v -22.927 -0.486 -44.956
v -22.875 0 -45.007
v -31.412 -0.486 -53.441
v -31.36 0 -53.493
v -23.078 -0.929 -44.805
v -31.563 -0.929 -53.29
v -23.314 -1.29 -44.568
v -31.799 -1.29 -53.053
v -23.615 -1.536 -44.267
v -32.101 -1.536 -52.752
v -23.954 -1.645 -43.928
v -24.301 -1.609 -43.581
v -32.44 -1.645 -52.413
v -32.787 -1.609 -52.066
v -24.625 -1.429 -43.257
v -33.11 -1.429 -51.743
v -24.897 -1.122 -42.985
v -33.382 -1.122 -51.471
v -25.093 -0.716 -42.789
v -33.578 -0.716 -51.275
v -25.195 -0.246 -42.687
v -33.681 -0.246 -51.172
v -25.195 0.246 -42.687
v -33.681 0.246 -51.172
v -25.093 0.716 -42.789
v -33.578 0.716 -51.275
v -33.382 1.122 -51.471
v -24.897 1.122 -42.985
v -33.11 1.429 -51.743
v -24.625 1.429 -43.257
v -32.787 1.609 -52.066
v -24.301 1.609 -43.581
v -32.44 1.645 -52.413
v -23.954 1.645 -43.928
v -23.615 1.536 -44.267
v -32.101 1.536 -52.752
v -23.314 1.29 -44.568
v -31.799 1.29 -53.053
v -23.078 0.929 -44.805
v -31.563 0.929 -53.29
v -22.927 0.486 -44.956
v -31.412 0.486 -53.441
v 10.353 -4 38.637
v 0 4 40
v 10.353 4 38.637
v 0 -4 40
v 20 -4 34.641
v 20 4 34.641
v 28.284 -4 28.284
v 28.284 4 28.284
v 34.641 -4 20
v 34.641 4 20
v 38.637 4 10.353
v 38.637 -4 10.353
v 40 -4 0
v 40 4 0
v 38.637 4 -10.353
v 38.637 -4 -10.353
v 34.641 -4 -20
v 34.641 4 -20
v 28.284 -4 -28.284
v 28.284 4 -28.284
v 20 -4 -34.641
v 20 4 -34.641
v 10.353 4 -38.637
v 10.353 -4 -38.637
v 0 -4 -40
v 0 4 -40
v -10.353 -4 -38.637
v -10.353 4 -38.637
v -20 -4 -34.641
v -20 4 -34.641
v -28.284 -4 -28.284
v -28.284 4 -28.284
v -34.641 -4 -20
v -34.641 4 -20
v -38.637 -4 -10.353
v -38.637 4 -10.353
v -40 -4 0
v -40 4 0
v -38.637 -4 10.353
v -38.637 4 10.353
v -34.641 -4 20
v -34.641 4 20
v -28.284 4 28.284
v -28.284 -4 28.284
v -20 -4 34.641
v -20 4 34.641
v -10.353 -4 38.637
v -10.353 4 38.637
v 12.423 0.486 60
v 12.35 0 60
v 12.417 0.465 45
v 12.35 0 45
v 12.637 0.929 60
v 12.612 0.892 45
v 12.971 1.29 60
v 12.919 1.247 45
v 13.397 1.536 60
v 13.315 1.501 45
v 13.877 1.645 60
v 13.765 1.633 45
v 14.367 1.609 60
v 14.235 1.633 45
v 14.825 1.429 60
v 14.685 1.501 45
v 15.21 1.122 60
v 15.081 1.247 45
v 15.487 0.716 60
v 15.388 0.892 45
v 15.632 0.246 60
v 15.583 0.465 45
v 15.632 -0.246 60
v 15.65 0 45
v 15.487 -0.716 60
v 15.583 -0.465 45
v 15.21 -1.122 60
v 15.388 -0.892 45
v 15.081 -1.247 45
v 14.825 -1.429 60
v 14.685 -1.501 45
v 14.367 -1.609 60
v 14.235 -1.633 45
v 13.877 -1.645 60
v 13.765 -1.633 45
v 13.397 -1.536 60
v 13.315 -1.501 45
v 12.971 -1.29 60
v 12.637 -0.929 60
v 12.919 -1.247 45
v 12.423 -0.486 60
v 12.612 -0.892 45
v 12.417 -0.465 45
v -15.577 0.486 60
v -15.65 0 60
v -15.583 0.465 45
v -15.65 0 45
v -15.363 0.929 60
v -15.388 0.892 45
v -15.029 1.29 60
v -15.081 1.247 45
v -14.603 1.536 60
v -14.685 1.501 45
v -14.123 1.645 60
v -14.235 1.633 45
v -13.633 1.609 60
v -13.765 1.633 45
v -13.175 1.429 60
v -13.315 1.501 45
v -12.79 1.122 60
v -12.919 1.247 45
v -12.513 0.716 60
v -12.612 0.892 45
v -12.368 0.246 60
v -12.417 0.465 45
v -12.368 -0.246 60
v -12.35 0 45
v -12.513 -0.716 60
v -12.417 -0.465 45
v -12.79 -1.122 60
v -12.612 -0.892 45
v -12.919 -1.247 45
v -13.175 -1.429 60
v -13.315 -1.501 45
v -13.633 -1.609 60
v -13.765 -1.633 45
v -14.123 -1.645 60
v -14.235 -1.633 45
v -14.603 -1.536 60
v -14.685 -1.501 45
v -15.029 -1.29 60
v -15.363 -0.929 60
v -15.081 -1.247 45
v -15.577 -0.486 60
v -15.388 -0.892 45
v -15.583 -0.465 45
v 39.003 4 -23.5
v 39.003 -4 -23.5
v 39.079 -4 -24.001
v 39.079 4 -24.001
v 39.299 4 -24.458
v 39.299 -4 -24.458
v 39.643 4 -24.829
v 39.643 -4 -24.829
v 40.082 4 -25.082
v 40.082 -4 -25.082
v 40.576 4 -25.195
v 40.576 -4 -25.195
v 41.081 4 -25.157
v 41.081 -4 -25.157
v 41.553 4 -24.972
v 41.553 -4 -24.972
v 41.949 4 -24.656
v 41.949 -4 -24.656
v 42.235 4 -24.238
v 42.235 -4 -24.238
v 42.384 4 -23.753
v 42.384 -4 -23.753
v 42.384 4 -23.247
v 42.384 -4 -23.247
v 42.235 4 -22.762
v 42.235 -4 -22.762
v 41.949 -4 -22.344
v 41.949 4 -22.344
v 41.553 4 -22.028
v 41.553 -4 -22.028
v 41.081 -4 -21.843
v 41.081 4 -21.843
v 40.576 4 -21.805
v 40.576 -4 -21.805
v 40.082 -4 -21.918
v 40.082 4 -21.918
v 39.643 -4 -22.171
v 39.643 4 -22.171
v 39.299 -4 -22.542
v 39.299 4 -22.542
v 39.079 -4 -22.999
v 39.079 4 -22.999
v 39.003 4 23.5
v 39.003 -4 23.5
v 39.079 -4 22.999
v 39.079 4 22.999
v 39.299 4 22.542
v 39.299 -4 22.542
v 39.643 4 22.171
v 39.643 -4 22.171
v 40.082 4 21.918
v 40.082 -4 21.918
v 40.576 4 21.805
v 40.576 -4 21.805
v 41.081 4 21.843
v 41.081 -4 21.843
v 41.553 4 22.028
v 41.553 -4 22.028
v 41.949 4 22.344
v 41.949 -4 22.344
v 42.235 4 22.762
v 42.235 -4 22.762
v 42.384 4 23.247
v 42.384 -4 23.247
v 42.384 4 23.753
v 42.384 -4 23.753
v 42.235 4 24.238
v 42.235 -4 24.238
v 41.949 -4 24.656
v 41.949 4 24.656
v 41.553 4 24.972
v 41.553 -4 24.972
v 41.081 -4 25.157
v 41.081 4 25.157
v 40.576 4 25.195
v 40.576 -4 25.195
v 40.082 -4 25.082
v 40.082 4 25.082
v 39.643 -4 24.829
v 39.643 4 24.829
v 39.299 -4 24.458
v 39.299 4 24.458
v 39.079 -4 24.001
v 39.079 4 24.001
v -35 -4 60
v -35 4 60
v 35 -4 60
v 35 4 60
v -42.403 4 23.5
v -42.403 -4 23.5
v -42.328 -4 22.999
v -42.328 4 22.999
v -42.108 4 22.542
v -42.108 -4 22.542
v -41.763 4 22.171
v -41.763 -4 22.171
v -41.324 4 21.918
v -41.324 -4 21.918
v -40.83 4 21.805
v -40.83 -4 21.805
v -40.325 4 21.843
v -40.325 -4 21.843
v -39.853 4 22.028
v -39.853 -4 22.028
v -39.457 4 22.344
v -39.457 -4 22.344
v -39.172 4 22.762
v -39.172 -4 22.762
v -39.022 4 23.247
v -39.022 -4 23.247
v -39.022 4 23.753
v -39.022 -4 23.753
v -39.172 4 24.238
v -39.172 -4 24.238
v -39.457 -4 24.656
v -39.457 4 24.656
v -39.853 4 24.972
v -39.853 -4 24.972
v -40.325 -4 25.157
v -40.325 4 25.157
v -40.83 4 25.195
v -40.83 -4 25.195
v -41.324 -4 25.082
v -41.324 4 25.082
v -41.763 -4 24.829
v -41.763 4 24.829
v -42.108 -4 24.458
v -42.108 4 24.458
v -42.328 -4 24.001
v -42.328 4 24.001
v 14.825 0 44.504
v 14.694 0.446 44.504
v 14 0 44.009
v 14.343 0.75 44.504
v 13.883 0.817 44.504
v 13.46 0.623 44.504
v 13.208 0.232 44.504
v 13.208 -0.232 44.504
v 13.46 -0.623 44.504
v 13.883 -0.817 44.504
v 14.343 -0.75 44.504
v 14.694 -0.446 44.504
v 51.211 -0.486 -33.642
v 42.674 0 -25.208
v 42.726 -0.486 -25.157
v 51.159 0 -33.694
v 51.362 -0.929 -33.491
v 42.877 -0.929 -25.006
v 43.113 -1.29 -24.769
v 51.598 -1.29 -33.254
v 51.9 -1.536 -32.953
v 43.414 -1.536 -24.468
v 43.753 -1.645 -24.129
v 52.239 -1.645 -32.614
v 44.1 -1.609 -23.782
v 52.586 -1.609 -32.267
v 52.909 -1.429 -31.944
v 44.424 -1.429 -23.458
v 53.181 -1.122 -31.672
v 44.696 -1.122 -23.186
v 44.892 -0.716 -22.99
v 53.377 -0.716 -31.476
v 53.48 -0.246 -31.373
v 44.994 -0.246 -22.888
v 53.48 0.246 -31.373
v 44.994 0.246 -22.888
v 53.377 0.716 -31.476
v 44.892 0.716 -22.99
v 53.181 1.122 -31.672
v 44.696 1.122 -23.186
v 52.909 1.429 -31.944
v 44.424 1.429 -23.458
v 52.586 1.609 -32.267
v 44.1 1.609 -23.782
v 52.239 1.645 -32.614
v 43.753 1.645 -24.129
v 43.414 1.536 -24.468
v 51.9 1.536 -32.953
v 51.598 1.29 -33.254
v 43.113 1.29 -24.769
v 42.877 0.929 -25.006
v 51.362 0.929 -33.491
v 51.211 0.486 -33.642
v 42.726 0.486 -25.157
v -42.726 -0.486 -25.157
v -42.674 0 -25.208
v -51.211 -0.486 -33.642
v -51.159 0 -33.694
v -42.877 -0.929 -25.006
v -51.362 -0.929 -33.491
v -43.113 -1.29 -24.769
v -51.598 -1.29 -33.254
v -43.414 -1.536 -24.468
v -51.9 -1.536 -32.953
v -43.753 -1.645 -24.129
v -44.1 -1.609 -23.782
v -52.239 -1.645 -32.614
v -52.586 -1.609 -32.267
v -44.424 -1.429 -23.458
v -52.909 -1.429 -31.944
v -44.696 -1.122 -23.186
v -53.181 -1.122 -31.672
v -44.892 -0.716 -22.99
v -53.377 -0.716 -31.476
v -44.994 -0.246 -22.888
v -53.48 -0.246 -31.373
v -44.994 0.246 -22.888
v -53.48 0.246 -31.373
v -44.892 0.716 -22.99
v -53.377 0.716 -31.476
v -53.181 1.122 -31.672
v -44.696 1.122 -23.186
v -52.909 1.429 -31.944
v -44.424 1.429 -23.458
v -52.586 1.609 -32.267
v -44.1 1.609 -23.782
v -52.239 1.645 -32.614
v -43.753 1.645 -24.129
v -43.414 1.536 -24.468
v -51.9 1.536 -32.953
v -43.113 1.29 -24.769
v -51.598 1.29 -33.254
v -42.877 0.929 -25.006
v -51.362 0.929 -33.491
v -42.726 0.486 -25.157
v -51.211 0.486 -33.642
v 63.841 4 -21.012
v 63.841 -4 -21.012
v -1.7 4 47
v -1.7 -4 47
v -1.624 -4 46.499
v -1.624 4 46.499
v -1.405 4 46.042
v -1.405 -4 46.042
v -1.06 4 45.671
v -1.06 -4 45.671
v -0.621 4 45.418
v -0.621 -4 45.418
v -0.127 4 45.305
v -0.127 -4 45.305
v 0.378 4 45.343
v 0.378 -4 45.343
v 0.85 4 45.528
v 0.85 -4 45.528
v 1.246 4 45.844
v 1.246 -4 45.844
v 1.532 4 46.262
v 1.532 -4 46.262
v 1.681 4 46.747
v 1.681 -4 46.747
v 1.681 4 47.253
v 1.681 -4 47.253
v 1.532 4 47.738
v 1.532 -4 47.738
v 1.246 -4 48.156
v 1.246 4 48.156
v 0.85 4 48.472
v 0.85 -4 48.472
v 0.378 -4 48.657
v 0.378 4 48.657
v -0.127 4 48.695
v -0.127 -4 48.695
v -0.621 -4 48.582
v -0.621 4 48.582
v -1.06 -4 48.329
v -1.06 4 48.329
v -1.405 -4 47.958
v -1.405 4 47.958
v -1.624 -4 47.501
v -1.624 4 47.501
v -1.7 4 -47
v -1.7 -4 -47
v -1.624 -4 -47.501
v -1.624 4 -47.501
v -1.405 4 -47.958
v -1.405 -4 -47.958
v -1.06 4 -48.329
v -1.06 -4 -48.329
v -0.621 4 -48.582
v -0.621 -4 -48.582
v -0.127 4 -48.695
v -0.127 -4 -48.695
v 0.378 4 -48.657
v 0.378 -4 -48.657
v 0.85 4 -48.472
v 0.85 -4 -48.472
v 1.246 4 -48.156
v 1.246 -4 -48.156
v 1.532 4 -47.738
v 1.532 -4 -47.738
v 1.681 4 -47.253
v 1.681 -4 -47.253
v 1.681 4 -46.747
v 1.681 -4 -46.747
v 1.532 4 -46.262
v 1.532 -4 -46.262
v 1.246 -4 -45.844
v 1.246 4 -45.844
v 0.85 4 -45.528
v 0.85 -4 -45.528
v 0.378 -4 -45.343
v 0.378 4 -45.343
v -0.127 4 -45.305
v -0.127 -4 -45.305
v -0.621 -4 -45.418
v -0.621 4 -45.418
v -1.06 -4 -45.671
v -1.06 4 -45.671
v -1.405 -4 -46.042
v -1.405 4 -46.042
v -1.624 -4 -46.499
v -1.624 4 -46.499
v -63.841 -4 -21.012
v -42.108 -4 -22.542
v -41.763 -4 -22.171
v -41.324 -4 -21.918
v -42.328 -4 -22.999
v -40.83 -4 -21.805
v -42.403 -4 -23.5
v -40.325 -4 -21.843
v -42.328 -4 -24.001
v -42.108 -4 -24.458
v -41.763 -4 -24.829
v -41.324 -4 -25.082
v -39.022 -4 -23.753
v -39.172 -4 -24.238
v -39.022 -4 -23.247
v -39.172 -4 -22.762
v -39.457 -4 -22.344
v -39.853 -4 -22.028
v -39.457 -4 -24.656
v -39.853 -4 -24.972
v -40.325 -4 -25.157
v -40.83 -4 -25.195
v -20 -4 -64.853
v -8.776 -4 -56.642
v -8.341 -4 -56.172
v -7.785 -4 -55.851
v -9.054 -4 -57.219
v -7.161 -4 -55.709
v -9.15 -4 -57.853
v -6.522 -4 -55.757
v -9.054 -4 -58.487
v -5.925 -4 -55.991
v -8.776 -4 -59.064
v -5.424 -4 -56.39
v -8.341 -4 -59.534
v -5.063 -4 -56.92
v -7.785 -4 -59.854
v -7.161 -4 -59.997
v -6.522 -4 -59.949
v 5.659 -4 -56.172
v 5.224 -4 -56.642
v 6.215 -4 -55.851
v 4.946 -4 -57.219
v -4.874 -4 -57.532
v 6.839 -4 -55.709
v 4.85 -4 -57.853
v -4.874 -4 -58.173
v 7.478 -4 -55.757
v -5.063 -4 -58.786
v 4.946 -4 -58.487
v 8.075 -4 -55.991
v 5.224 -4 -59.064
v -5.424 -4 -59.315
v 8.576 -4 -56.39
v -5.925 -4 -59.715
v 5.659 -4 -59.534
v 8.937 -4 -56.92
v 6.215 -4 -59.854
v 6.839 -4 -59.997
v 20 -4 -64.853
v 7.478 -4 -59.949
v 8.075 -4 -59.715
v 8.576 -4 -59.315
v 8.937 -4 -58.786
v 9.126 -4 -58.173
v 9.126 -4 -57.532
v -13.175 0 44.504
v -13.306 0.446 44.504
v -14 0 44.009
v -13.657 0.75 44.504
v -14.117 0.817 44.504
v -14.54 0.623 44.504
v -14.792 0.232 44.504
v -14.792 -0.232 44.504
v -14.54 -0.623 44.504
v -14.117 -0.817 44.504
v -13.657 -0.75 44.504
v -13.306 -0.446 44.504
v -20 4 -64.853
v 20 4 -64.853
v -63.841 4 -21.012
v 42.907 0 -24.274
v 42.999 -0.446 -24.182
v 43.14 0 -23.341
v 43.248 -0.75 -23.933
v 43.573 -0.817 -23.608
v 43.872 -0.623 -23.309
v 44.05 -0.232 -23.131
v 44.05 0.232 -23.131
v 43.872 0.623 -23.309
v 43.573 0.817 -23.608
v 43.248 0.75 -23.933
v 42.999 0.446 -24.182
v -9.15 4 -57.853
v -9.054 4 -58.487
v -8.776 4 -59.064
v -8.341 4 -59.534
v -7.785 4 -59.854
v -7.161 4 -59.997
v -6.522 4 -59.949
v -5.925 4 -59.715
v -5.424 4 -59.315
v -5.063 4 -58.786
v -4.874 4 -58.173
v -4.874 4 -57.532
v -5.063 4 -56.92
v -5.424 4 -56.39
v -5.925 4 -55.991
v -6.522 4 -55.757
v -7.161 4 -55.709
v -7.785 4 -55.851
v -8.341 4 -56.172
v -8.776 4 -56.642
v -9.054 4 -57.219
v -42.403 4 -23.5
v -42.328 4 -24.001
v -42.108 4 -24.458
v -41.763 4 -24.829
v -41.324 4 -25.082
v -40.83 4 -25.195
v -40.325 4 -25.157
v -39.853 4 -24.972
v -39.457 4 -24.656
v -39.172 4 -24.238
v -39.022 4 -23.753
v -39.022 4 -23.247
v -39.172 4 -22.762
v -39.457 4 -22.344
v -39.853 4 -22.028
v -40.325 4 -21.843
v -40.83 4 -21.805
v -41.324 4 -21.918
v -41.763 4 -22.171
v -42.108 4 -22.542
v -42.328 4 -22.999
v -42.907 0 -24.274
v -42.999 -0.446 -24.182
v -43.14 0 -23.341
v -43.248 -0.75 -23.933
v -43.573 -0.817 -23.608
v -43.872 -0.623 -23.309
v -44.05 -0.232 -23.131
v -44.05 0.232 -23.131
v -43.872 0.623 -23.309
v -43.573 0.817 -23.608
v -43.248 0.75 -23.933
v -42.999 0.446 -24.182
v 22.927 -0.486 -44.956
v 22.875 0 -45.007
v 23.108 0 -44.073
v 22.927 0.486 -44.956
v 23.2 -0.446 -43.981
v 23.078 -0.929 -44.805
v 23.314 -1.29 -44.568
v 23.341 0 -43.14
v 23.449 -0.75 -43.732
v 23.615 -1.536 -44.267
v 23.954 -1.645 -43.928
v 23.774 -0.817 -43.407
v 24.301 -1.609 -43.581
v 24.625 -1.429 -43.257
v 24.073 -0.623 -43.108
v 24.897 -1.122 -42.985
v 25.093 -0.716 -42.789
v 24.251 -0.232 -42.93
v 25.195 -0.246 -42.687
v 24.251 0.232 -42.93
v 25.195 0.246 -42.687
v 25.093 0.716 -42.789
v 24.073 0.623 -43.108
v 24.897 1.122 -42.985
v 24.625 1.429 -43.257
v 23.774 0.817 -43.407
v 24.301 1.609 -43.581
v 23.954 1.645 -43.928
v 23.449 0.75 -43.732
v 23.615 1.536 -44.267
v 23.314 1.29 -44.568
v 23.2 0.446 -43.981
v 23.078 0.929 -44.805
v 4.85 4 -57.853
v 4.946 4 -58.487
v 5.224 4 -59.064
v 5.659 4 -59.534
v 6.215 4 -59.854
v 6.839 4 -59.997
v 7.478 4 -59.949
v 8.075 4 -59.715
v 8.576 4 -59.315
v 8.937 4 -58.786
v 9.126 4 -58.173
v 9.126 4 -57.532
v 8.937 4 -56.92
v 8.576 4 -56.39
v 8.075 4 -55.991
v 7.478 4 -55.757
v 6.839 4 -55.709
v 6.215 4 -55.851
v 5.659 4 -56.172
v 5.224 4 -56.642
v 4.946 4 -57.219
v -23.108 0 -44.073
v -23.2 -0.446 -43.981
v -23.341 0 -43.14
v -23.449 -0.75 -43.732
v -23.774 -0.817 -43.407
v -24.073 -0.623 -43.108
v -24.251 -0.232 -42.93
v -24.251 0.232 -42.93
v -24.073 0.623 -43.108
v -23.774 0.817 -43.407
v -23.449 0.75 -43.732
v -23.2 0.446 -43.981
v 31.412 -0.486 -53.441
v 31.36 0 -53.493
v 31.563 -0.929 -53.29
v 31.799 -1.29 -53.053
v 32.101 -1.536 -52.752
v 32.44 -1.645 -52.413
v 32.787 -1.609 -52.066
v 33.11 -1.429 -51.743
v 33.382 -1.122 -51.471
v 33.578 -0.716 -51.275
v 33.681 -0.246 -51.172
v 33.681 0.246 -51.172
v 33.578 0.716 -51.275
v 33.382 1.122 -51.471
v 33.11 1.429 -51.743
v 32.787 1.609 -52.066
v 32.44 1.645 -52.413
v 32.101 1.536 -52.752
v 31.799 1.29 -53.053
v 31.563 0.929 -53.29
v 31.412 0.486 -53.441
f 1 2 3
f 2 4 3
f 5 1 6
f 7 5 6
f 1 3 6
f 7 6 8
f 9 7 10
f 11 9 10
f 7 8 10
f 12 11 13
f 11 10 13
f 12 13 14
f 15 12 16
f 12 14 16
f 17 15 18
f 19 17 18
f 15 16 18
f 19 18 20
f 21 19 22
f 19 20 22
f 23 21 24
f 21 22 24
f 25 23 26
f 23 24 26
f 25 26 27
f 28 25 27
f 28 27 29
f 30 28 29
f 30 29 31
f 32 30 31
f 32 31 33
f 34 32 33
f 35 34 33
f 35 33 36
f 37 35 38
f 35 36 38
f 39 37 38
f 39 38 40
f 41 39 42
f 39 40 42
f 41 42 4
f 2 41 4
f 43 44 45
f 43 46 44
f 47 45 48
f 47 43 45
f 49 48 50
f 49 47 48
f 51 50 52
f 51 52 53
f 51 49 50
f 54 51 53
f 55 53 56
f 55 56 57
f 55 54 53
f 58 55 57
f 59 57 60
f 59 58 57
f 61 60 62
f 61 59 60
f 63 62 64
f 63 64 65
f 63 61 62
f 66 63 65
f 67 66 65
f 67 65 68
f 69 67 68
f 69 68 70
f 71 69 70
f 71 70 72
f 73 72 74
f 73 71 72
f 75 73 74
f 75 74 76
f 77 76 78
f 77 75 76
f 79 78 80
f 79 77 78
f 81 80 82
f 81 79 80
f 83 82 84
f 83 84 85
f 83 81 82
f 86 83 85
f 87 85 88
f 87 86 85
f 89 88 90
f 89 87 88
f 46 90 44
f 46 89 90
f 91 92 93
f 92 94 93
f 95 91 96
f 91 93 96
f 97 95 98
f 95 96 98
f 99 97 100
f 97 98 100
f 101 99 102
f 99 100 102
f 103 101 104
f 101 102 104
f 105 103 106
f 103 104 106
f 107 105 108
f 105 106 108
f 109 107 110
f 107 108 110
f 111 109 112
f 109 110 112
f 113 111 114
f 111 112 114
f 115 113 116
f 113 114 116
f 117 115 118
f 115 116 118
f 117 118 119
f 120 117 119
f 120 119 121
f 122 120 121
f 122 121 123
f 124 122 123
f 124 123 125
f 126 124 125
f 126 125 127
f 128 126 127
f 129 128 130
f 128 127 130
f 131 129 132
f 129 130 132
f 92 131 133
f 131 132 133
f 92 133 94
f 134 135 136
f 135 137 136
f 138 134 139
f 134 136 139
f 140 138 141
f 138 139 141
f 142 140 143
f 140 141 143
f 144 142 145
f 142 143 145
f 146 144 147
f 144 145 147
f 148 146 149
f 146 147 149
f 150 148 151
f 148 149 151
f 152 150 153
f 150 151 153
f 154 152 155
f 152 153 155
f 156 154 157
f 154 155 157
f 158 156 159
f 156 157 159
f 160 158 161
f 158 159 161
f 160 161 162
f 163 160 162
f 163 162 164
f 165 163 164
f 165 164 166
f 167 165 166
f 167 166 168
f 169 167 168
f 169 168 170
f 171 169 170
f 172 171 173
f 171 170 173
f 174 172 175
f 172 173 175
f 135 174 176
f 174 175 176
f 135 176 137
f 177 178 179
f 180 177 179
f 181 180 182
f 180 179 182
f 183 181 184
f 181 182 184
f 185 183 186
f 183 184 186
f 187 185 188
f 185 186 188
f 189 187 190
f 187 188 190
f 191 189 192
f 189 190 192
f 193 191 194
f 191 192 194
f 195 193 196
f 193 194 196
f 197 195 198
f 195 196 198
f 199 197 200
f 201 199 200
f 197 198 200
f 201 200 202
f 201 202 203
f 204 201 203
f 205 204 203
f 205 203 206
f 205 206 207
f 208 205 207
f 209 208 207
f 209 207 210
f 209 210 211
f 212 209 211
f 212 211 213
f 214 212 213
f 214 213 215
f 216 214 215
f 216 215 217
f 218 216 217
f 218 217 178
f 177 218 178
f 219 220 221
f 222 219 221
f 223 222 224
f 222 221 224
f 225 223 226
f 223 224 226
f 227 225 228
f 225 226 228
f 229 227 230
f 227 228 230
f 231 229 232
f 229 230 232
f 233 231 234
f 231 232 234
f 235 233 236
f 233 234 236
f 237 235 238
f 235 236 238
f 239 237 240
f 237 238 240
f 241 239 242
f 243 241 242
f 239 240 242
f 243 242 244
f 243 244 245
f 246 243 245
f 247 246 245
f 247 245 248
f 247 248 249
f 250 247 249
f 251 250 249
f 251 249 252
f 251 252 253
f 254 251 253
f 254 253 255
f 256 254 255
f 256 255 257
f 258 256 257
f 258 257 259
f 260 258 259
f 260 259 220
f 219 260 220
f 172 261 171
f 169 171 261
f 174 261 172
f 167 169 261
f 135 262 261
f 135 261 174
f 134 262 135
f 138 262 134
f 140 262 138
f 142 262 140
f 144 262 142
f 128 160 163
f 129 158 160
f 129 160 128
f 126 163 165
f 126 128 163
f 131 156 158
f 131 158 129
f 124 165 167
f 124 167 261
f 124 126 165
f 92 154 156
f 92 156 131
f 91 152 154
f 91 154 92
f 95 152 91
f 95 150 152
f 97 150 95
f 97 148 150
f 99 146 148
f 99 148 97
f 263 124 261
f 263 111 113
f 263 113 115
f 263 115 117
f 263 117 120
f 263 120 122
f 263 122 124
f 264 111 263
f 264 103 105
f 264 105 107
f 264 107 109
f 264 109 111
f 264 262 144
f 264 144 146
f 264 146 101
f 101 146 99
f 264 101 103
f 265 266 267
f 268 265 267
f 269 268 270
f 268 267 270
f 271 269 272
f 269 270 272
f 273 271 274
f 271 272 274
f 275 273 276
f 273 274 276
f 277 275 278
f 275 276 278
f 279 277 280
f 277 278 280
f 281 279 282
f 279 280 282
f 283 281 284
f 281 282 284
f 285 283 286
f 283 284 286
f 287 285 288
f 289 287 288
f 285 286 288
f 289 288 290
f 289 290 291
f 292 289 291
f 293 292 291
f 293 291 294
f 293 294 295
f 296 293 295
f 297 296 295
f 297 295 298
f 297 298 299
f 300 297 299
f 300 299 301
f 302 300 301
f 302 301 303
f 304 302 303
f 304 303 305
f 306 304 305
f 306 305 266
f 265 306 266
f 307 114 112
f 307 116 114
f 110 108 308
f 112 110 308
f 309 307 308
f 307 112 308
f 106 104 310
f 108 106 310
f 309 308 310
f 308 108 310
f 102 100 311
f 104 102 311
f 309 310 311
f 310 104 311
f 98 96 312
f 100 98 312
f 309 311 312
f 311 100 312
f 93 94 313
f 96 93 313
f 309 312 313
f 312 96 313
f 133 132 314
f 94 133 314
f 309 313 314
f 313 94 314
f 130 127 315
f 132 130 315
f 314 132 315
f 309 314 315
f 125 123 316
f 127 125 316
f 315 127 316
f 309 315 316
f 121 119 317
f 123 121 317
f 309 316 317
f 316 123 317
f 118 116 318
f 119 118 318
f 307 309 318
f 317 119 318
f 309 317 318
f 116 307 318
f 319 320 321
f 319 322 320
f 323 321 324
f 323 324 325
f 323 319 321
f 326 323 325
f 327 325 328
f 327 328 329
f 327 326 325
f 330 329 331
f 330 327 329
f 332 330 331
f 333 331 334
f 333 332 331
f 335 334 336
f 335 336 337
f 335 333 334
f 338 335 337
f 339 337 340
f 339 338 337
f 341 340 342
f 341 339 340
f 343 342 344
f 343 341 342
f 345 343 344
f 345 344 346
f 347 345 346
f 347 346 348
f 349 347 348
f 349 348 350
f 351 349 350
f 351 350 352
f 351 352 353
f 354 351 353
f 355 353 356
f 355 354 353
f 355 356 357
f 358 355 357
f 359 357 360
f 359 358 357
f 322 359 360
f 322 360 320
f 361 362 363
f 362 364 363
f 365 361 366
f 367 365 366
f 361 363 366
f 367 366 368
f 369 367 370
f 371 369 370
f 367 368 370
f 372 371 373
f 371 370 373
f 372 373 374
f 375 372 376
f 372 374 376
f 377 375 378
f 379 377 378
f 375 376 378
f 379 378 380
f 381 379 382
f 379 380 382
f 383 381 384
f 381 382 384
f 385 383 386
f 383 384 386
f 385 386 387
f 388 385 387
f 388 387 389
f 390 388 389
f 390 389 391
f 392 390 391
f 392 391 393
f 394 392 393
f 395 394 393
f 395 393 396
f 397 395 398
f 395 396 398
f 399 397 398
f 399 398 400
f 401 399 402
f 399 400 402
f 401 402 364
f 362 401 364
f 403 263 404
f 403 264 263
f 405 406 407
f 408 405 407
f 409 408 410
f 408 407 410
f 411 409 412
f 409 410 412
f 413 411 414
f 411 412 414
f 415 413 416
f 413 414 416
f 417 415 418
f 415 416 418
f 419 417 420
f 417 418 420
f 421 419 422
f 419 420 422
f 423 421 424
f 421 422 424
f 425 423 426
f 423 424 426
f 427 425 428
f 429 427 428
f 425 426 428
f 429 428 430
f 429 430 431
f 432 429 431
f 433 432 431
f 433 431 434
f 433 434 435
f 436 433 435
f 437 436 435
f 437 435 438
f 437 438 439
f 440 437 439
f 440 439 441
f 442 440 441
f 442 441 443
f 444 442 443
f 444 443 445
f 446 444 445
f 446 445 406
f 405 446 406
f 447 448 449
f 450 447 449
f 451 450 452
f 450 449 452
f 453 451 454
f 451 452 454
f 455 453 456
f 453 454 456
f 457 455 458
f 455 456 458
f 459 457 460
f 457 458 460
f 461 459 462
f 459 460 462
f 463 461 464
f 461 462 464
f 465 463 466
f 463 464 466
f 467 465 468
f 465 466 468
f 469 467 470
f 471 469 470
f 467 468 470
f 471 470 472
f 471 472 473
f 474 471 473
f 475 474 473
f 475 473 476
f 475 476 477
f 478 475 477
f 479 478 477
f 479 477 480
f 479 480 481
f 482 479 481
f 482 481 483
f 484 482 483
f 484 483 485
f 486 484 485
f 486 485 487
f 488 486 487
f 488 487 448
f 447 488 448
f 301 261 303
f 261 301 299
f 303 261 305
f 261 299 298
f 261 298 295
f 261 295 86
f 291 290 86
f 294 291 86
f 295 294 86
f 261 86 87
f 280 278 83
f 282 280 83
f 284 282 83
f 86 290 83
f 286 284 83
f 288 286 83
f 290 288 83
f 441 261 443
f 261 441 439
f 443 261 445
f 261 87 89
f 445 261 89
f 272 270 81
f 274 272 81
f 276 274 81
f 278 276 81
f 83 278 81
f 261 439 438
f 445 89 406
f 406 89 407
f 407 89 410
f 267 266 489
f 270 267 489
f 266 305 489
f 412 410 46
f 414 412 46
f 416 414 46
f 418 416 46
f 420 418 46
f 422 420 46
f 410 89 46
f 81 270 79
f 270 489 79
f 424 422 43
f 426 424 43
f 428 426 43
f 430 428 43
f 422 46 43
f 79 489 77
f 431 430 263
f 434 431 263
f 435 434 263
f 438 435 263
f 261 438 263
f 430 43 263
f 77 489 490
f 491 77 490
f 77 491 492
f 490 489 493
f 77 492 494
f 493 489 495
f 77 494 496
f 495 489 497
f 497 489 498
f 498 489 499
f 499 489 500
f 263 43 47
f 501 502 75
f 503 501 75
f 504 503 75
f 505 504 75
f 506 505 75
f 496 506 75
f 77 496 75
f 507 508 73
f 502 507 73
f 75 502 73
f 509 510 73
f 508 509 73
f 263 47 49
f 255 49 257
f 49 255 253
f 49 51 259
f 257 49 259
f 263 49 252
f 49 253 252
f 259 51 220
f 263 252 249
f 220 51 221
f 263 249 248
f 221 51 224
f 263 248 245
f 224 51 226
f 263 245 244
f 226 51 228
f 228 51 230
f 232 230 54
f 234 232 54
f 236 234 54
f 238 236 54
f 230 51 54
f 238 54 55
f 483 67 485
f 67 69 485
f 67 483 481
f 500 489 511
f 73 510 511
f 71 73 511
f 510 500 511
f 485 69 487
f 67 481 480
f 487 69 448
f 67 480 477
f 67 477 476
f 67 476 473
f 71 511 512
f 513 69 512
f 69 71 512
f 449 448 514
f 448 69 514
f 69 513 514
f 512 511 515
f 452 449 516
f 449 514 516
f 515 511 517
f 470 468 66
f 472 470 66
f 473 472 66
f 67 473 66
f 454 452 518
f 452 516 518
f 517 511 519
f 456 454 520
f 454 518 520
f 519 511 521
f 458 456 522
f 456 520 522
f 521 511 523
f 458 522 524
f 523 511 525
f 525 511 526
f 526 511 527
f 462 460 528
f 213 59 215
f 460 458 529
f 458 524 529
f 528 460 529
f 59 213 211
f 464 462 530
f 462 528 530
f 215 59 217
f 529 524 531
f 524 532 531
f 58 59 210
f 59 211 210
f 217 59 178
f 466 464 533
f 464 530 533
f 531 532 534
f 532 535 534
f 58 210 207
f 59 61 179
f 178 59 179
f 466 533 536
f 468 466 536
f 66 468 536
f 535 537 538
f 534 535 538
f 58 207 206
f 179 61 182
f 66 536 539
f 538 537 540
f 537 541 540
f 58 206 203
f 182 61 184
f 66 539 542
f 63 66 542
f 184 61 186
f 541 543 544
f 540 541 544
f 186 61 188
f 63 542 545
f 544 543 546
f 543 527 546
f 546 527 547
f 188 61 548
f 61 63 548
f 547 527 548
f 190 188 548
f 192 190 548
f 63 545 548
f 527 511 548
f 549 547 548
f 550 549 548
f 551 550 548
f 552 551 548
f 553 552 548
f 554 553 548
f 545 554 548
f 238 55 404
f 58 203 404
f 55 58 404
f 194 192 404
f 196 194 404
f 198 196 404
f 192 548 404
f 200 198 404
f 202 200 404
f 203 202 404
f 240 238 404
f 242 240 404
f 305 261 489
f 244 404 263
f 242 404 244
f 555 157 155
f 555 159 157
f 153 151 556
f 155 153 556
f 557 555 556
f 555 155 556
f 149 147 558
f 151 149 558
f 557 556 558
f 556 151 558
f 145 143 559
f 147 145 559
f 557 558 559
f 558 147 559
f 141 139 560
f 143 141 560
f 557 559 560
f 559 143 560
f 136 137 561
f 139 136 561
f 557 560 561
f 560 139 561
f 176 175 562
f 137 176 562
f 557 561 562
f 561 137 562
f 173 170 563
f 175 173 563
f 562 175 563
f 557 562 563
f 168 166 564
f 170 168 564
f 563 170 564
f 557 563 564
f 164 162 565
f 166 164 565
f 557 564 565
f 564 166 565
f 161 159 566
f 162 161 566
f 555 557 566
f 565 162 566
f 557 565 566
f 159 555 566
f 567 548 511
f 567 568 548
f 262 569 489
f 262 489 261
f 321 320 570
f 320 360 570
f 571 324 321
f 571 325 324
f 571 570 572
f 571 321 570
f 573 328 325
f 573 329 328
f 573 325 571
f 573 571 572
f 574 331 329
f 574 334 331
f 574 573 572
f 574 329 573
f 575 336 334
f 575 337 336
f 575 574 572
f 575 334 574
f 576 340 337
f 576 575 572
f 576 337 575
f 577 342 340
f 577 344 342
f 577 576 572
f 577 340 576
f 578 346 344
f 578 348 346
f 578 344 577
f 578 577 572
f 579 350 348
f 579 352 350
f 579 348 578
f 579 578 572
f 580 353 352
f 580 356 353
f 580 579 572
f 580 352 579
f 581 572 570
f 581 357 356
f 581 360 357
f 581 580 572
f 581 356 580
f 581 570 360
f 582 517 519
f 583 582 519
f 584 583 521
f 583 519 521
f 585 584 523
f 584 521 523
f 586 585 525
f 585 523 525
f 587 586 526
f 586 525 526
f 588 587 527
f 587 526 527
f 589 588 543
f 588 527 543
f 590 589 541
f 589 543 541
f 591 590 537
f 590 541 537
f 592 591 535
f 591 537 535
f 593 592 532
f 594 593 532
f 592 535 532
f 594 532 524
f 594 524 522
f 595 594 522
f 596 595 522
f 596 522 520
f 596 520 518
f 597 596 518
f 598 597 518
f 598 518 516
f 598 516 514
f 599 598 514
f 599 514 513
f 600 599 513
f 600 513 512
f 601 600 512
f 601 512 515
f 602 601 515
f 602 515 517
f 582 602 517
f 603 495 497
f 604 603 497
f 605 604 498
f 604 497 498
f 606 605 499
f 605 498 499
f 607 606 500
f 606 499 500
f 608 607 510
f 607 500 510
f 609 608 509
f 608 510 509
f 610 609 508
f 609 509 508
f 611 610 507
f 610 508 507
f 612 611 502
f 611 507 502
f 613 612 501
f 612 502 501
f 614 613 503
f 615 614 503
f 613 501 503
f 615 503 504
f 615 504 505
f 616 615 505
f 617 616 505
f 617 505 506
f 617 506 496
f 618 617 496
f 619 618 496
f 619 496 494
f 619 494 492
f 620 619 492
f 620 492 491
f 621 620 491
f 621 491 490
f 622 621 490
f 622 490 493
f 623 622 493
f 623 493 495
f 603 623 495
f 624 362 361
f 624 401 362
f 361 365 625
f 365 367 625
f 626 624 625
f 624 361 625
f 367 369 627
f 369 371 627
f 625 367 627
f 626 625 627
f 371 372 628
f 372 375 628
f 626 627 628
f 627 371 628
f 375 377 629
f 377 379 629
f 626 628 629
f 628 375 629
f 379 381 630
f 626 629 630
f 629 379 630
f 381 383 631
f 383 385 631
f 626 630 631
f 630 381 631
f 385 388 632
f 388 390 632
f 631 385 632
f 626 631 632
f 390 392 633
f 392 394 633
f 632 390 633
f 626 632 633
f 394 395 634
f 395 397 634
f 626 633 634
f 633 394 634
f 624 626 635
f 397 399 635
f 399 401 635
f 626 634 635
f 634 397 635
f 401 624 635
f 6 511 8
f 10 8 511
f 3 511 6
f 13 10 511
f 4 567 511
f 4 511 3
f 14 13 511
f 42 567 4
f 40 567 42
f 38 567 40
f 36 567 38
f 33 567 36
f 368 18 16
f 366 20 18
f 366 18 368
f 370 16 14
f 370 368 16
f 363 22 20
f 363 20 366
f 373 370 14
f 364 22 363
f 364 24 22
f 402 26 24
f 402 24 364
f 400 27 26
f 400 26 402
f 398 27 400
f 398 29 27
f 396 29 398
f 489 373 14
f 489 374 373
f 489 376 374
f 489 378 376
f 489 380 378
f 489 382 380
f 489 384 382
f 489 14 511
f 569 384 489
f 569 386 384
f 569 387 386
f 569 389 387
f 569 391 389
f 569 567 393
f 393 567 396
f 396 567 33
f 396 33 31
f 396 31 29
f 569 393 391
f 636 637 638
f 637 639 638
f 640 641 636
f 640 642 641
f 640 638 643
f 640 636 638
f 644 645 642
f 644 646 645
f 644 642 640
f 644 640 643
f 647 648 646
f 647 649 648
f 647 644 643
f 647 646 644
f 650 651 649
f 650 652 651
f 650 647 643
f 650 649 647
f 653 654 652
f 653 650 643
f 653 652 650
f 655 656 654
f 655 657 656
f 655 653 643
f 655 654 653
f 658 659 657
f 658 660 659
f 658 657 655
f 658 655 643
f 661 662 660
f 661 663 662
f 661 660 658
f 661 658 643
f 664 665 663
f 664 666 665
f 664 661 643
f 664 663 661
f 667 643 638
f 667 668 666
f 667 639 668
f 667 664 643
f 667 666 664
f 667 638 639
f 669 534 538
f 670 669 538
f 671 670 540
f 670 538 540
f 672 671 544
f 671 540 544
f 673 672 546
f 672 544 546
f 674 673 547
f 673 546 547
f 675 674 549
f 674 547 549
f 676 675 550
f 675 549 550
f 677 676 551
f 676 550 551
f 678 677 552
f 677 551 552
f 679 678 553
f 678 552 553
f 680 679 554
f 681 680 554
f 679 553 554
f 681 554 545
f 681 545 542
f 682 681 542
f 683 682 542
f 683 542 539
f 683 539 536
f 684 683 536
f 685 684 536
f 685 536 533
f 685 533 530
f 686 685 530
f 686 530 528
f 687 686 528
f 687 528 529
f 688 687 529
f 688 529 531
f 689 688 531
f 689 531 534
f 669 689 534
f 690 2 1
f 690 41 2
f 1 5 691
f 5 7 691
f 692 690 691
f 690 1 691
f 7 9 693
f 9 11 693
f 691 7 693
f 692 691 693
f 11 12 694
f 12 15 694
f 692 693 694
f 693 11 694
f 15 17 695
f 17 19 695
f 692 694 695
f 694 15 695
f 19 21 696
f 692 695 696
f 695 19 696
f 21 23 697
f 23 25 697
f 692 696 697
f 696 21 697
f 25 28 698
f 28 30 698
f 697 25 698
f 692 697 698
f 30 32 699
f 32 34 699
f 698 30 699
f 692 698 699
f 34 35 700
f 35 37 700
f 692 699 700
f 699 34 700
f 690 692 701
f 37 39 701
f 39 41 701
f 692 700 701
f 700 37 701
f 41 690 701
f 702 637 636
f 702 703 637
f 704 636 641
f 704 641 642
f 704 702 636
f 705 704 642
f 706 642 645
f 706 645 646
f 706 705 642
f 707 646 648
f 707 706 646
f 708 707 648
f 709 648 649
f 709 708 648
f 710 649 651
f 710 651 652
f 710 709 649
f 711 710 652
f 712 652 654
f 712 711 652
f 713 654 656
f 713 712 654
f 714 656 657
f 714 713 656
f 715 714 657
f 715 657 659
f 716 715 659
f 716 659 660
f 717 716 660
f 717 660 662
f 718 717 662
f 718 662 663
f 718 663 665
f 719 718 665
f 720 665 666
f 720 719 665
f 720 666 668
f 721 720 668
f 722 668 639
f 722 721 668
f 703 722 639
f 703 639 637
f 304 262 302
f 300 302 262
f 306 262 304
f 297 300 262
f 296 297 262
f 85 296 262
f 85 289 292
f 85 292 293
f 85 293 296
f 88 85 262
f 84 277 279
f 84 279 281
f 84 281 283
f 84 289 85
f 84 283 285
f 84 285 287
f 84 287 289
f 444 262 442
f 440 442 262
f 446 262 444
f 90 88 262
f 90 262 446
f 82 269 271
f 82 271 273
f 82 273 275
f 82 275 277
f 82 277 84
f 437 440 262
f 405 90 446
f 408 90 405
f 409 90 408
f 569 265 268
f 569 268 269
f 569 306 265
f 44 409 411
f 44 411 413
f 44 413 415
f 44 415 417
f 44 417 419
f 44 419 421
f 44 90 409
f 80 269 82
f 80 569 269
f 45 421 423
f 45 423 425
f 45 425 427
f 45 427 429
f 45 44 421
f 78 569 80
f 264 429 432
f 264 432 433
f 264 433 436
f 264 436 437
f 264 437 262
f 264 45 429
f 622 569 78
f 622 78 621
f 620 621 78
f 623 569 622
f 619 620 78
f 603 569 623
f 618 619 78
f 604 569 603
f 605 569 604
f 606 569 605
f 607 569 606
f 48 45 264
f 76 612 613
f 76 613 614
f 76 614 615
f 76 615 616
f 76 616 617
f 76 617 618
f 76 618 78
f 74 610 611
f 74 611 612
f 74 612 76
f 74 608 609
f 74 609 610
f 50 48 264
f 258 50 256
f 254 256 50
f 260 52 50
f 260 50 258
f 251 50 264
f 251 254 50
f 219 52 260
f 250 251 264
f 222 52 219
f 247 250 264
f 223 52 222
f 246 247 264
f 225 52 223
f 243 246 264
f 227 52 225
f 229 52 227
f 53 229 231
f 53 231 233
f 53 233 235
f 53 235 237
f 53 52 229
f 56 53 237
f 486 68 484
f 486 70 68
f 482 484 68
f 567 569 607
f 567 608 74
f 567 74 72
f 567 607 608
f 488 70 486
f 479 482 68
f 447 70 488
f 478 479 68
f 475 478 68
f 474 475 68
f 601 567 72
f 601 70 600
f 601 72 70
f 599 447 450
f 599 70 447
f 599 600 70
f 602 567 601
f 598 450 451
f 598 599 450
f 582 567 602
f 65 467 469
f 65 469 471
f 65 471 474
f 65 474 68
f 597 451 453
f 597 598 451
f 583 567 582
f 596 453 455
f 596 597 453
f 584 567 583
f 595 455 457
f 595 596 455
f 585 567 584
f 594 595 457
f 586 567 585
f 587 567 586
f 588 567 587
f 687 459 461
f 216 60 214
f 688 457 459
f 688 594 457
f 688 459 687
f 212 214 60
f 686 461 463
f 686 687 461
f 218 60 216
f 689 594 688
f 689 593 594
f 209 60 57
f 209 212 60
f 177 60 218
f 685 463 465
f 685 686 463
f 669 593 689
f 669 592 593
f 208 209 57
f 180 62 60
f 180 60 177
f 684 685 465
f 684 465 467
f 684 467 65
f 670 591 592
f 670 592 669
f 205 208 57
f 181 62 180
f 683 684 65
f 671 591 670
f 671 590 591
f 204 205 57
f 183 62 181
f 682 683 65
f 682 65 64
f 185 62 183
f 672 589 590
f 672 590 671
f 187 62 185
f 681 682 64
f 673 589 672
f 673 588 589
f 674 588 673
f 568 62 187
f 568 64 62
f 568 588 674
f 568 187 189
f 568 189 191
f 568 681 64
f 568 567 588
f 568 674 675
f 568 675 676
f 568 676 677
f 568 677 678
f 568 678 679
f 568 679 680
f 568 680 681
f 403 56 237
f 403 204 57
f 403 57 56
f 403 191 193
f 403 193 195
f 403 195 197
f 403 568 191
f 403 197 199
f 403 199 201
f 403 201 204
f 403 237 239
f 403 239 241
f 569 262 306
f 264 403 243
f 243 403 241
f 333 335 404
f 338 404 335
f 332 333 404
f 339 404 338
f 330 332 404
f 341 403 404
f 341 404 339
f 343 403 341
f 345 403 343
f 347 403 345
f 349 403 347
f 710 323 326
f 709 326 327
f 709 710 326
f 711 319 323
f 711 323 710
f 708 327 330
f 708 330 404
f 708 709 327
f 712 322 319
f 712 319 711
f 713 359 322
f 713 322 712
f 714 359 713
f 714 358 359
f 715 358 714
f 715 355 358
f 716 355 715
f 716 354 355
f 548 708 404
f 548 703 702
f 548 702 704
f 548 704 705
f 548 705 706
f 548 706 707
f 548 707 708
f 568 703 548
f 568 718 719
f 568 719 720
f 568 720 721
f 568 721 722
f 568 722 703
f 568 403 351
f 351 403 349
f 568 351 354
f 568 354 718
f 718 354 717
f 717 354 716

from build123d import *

# Parameters (mm, degrees)
SKETCH_2_R                  = 40
EXTRUDE_1_DEPTH             = 4
HOLE_WIZARD_M3_1_D          = 3.4
HOLE_WIZARD_M4_1_AT_2_COUNT = 2
HOLE_WIZARD_M4_1_AT_2_PITCH = 28
HOLE_WIZARD_M4_3_D          = 3.3
HOLE_WIZARD_M4_3_DEPTH      = 15
HOLE_WIZARD_M4_3_TIP        = 0.991420021
HOLE_WIZARD_M4_1_2_D        = 4.3


with BuildPart() as part:
    # 草图2 → 凸台-拉伸1 (new, symmetric)
    with BuildSketch(Plane(origin=(0, 0, 0), x_dir=(1, 0, 0), z_dir=(0, 1, 0))):
        Polygon((20, 64.852813742), (-20, 64.852813742), (-63.840620434, 21.012193309), (-35, -60), (35, -60), (63.840620434, 21.012193309), align=None)
        with Locations(Location((0, 0, 0), (0, 0, 270))):
            Circle(SKETCH_2_R, mode=Mode.SUBTRACT)
    extrude(amount=EXTRUDE_1_DEPTH, both=True)

    # M3 间隙孔1 (through all)
    with Locations(Plane(origin=(0, 4, 0), x_dir=(1, 0, 0), z_dir=(0, 1, 0))):
        with Locations((0, 47), (40.703193978, 23.5), (40.703193978, -23.5), (0, -47), (-40.703193978, -23.5), (-40.703193978, 23.5)):
            Hole(HOLE_WIZARD_M3_1_D / 2)

    # 草图7 → Hole Wizard M4 _1 (revolve, cut)
    with BuildSketch(Plane(origin=(32.526911935, 0, -52.325901808), x_dir=(-0.7071067811865476, 0, -0.7071067811865476), z_dir=(0, 1, 0))):
        Polygon((0, 0), (0, 12.991420021), (1.65, 12), (1.65, 0), align=None)
    hole_wizard_m4_1 = revolve(axis=Axis((37.017039995, 0, -56.816029868), (-0.7071067811865476, 0, 0.7071067811865476)), mode=Mode.SUBTRACT)

    # Hole Wizard M4 _1 at 2: Hole Wizard M4 _1 ×2
    with Locations(*[Vector(0.7071067811865476, 0, 0.7071067811865476) * (i * HOLE_WIZARD_M4_1_AT_2_PITCH) for i in range(1, HOLE_WIZARD_M4_1_AT_2_COUNT)]):
        add(hole_wizard_m4_1, mode=Mode.SUBTRACT)

    # 镜向1: Hole Wizard M4 _1 across plane
    add(hole_wizard_m4_1.mirror(Plane(origin=(0, 0, 0), x_dir=(0, 0, 1), z_dir=(1, 0, 0))), mode=Mode.SUBTRACT)

    # 镜向1 copy 1 sketch → 镜向1 copy 1 (revolve, cut)
    with BuildSketch(Plane(origin=(-52.325901808, 0, -32.526911935), x_dir=(0.7071067811865476, 0, -0.7071067811865476), z_dir=(0, 1, 0))):
        Polygon((0, 0), (0, -12.991420021), (1.65, -12), (1.65, 0), align=None)
    revolve(axis=Axis((-56.816029868, 0, -37.017039995), (-0.7071067811865476, 0, -0.7071067811865476)), mode=Mode.SUBTRACT)

    # M4 螺纹孔3
    with Locations(Plane.XY.offset(60)):
        with Locations((14, 0), (-14, 0)):
            Hole(HOLE_WIZARD_M4_3_D / 2, depth=HOLE_WIZARD_M4_3_DEPTH)
            with Locations((0, 0, -(HOLE_WIZARD_M4_3_DEPTH + HOLE_WIZARD_M4_3_TIP / 2))):  # 118° drill point
                Cone(0, HOLE_WIZARD_M4_3_D / 2, HOLE_WIZARD_M4_3_TIP, mode=Mode.SUBTRACT)

    # Hole Wizard M4 _1 2 (through all)
    with Locations(Plane(origin=(0, 4, 0), x_dir=(1, 0, 0), z_dir=(0, 1, 0))):
        with Locations((-7, 57.852813742), (7, 57.852813742)):
            Hole(HOLE_WIZARD_M4_1_2_D / 2)


solid = part.part
